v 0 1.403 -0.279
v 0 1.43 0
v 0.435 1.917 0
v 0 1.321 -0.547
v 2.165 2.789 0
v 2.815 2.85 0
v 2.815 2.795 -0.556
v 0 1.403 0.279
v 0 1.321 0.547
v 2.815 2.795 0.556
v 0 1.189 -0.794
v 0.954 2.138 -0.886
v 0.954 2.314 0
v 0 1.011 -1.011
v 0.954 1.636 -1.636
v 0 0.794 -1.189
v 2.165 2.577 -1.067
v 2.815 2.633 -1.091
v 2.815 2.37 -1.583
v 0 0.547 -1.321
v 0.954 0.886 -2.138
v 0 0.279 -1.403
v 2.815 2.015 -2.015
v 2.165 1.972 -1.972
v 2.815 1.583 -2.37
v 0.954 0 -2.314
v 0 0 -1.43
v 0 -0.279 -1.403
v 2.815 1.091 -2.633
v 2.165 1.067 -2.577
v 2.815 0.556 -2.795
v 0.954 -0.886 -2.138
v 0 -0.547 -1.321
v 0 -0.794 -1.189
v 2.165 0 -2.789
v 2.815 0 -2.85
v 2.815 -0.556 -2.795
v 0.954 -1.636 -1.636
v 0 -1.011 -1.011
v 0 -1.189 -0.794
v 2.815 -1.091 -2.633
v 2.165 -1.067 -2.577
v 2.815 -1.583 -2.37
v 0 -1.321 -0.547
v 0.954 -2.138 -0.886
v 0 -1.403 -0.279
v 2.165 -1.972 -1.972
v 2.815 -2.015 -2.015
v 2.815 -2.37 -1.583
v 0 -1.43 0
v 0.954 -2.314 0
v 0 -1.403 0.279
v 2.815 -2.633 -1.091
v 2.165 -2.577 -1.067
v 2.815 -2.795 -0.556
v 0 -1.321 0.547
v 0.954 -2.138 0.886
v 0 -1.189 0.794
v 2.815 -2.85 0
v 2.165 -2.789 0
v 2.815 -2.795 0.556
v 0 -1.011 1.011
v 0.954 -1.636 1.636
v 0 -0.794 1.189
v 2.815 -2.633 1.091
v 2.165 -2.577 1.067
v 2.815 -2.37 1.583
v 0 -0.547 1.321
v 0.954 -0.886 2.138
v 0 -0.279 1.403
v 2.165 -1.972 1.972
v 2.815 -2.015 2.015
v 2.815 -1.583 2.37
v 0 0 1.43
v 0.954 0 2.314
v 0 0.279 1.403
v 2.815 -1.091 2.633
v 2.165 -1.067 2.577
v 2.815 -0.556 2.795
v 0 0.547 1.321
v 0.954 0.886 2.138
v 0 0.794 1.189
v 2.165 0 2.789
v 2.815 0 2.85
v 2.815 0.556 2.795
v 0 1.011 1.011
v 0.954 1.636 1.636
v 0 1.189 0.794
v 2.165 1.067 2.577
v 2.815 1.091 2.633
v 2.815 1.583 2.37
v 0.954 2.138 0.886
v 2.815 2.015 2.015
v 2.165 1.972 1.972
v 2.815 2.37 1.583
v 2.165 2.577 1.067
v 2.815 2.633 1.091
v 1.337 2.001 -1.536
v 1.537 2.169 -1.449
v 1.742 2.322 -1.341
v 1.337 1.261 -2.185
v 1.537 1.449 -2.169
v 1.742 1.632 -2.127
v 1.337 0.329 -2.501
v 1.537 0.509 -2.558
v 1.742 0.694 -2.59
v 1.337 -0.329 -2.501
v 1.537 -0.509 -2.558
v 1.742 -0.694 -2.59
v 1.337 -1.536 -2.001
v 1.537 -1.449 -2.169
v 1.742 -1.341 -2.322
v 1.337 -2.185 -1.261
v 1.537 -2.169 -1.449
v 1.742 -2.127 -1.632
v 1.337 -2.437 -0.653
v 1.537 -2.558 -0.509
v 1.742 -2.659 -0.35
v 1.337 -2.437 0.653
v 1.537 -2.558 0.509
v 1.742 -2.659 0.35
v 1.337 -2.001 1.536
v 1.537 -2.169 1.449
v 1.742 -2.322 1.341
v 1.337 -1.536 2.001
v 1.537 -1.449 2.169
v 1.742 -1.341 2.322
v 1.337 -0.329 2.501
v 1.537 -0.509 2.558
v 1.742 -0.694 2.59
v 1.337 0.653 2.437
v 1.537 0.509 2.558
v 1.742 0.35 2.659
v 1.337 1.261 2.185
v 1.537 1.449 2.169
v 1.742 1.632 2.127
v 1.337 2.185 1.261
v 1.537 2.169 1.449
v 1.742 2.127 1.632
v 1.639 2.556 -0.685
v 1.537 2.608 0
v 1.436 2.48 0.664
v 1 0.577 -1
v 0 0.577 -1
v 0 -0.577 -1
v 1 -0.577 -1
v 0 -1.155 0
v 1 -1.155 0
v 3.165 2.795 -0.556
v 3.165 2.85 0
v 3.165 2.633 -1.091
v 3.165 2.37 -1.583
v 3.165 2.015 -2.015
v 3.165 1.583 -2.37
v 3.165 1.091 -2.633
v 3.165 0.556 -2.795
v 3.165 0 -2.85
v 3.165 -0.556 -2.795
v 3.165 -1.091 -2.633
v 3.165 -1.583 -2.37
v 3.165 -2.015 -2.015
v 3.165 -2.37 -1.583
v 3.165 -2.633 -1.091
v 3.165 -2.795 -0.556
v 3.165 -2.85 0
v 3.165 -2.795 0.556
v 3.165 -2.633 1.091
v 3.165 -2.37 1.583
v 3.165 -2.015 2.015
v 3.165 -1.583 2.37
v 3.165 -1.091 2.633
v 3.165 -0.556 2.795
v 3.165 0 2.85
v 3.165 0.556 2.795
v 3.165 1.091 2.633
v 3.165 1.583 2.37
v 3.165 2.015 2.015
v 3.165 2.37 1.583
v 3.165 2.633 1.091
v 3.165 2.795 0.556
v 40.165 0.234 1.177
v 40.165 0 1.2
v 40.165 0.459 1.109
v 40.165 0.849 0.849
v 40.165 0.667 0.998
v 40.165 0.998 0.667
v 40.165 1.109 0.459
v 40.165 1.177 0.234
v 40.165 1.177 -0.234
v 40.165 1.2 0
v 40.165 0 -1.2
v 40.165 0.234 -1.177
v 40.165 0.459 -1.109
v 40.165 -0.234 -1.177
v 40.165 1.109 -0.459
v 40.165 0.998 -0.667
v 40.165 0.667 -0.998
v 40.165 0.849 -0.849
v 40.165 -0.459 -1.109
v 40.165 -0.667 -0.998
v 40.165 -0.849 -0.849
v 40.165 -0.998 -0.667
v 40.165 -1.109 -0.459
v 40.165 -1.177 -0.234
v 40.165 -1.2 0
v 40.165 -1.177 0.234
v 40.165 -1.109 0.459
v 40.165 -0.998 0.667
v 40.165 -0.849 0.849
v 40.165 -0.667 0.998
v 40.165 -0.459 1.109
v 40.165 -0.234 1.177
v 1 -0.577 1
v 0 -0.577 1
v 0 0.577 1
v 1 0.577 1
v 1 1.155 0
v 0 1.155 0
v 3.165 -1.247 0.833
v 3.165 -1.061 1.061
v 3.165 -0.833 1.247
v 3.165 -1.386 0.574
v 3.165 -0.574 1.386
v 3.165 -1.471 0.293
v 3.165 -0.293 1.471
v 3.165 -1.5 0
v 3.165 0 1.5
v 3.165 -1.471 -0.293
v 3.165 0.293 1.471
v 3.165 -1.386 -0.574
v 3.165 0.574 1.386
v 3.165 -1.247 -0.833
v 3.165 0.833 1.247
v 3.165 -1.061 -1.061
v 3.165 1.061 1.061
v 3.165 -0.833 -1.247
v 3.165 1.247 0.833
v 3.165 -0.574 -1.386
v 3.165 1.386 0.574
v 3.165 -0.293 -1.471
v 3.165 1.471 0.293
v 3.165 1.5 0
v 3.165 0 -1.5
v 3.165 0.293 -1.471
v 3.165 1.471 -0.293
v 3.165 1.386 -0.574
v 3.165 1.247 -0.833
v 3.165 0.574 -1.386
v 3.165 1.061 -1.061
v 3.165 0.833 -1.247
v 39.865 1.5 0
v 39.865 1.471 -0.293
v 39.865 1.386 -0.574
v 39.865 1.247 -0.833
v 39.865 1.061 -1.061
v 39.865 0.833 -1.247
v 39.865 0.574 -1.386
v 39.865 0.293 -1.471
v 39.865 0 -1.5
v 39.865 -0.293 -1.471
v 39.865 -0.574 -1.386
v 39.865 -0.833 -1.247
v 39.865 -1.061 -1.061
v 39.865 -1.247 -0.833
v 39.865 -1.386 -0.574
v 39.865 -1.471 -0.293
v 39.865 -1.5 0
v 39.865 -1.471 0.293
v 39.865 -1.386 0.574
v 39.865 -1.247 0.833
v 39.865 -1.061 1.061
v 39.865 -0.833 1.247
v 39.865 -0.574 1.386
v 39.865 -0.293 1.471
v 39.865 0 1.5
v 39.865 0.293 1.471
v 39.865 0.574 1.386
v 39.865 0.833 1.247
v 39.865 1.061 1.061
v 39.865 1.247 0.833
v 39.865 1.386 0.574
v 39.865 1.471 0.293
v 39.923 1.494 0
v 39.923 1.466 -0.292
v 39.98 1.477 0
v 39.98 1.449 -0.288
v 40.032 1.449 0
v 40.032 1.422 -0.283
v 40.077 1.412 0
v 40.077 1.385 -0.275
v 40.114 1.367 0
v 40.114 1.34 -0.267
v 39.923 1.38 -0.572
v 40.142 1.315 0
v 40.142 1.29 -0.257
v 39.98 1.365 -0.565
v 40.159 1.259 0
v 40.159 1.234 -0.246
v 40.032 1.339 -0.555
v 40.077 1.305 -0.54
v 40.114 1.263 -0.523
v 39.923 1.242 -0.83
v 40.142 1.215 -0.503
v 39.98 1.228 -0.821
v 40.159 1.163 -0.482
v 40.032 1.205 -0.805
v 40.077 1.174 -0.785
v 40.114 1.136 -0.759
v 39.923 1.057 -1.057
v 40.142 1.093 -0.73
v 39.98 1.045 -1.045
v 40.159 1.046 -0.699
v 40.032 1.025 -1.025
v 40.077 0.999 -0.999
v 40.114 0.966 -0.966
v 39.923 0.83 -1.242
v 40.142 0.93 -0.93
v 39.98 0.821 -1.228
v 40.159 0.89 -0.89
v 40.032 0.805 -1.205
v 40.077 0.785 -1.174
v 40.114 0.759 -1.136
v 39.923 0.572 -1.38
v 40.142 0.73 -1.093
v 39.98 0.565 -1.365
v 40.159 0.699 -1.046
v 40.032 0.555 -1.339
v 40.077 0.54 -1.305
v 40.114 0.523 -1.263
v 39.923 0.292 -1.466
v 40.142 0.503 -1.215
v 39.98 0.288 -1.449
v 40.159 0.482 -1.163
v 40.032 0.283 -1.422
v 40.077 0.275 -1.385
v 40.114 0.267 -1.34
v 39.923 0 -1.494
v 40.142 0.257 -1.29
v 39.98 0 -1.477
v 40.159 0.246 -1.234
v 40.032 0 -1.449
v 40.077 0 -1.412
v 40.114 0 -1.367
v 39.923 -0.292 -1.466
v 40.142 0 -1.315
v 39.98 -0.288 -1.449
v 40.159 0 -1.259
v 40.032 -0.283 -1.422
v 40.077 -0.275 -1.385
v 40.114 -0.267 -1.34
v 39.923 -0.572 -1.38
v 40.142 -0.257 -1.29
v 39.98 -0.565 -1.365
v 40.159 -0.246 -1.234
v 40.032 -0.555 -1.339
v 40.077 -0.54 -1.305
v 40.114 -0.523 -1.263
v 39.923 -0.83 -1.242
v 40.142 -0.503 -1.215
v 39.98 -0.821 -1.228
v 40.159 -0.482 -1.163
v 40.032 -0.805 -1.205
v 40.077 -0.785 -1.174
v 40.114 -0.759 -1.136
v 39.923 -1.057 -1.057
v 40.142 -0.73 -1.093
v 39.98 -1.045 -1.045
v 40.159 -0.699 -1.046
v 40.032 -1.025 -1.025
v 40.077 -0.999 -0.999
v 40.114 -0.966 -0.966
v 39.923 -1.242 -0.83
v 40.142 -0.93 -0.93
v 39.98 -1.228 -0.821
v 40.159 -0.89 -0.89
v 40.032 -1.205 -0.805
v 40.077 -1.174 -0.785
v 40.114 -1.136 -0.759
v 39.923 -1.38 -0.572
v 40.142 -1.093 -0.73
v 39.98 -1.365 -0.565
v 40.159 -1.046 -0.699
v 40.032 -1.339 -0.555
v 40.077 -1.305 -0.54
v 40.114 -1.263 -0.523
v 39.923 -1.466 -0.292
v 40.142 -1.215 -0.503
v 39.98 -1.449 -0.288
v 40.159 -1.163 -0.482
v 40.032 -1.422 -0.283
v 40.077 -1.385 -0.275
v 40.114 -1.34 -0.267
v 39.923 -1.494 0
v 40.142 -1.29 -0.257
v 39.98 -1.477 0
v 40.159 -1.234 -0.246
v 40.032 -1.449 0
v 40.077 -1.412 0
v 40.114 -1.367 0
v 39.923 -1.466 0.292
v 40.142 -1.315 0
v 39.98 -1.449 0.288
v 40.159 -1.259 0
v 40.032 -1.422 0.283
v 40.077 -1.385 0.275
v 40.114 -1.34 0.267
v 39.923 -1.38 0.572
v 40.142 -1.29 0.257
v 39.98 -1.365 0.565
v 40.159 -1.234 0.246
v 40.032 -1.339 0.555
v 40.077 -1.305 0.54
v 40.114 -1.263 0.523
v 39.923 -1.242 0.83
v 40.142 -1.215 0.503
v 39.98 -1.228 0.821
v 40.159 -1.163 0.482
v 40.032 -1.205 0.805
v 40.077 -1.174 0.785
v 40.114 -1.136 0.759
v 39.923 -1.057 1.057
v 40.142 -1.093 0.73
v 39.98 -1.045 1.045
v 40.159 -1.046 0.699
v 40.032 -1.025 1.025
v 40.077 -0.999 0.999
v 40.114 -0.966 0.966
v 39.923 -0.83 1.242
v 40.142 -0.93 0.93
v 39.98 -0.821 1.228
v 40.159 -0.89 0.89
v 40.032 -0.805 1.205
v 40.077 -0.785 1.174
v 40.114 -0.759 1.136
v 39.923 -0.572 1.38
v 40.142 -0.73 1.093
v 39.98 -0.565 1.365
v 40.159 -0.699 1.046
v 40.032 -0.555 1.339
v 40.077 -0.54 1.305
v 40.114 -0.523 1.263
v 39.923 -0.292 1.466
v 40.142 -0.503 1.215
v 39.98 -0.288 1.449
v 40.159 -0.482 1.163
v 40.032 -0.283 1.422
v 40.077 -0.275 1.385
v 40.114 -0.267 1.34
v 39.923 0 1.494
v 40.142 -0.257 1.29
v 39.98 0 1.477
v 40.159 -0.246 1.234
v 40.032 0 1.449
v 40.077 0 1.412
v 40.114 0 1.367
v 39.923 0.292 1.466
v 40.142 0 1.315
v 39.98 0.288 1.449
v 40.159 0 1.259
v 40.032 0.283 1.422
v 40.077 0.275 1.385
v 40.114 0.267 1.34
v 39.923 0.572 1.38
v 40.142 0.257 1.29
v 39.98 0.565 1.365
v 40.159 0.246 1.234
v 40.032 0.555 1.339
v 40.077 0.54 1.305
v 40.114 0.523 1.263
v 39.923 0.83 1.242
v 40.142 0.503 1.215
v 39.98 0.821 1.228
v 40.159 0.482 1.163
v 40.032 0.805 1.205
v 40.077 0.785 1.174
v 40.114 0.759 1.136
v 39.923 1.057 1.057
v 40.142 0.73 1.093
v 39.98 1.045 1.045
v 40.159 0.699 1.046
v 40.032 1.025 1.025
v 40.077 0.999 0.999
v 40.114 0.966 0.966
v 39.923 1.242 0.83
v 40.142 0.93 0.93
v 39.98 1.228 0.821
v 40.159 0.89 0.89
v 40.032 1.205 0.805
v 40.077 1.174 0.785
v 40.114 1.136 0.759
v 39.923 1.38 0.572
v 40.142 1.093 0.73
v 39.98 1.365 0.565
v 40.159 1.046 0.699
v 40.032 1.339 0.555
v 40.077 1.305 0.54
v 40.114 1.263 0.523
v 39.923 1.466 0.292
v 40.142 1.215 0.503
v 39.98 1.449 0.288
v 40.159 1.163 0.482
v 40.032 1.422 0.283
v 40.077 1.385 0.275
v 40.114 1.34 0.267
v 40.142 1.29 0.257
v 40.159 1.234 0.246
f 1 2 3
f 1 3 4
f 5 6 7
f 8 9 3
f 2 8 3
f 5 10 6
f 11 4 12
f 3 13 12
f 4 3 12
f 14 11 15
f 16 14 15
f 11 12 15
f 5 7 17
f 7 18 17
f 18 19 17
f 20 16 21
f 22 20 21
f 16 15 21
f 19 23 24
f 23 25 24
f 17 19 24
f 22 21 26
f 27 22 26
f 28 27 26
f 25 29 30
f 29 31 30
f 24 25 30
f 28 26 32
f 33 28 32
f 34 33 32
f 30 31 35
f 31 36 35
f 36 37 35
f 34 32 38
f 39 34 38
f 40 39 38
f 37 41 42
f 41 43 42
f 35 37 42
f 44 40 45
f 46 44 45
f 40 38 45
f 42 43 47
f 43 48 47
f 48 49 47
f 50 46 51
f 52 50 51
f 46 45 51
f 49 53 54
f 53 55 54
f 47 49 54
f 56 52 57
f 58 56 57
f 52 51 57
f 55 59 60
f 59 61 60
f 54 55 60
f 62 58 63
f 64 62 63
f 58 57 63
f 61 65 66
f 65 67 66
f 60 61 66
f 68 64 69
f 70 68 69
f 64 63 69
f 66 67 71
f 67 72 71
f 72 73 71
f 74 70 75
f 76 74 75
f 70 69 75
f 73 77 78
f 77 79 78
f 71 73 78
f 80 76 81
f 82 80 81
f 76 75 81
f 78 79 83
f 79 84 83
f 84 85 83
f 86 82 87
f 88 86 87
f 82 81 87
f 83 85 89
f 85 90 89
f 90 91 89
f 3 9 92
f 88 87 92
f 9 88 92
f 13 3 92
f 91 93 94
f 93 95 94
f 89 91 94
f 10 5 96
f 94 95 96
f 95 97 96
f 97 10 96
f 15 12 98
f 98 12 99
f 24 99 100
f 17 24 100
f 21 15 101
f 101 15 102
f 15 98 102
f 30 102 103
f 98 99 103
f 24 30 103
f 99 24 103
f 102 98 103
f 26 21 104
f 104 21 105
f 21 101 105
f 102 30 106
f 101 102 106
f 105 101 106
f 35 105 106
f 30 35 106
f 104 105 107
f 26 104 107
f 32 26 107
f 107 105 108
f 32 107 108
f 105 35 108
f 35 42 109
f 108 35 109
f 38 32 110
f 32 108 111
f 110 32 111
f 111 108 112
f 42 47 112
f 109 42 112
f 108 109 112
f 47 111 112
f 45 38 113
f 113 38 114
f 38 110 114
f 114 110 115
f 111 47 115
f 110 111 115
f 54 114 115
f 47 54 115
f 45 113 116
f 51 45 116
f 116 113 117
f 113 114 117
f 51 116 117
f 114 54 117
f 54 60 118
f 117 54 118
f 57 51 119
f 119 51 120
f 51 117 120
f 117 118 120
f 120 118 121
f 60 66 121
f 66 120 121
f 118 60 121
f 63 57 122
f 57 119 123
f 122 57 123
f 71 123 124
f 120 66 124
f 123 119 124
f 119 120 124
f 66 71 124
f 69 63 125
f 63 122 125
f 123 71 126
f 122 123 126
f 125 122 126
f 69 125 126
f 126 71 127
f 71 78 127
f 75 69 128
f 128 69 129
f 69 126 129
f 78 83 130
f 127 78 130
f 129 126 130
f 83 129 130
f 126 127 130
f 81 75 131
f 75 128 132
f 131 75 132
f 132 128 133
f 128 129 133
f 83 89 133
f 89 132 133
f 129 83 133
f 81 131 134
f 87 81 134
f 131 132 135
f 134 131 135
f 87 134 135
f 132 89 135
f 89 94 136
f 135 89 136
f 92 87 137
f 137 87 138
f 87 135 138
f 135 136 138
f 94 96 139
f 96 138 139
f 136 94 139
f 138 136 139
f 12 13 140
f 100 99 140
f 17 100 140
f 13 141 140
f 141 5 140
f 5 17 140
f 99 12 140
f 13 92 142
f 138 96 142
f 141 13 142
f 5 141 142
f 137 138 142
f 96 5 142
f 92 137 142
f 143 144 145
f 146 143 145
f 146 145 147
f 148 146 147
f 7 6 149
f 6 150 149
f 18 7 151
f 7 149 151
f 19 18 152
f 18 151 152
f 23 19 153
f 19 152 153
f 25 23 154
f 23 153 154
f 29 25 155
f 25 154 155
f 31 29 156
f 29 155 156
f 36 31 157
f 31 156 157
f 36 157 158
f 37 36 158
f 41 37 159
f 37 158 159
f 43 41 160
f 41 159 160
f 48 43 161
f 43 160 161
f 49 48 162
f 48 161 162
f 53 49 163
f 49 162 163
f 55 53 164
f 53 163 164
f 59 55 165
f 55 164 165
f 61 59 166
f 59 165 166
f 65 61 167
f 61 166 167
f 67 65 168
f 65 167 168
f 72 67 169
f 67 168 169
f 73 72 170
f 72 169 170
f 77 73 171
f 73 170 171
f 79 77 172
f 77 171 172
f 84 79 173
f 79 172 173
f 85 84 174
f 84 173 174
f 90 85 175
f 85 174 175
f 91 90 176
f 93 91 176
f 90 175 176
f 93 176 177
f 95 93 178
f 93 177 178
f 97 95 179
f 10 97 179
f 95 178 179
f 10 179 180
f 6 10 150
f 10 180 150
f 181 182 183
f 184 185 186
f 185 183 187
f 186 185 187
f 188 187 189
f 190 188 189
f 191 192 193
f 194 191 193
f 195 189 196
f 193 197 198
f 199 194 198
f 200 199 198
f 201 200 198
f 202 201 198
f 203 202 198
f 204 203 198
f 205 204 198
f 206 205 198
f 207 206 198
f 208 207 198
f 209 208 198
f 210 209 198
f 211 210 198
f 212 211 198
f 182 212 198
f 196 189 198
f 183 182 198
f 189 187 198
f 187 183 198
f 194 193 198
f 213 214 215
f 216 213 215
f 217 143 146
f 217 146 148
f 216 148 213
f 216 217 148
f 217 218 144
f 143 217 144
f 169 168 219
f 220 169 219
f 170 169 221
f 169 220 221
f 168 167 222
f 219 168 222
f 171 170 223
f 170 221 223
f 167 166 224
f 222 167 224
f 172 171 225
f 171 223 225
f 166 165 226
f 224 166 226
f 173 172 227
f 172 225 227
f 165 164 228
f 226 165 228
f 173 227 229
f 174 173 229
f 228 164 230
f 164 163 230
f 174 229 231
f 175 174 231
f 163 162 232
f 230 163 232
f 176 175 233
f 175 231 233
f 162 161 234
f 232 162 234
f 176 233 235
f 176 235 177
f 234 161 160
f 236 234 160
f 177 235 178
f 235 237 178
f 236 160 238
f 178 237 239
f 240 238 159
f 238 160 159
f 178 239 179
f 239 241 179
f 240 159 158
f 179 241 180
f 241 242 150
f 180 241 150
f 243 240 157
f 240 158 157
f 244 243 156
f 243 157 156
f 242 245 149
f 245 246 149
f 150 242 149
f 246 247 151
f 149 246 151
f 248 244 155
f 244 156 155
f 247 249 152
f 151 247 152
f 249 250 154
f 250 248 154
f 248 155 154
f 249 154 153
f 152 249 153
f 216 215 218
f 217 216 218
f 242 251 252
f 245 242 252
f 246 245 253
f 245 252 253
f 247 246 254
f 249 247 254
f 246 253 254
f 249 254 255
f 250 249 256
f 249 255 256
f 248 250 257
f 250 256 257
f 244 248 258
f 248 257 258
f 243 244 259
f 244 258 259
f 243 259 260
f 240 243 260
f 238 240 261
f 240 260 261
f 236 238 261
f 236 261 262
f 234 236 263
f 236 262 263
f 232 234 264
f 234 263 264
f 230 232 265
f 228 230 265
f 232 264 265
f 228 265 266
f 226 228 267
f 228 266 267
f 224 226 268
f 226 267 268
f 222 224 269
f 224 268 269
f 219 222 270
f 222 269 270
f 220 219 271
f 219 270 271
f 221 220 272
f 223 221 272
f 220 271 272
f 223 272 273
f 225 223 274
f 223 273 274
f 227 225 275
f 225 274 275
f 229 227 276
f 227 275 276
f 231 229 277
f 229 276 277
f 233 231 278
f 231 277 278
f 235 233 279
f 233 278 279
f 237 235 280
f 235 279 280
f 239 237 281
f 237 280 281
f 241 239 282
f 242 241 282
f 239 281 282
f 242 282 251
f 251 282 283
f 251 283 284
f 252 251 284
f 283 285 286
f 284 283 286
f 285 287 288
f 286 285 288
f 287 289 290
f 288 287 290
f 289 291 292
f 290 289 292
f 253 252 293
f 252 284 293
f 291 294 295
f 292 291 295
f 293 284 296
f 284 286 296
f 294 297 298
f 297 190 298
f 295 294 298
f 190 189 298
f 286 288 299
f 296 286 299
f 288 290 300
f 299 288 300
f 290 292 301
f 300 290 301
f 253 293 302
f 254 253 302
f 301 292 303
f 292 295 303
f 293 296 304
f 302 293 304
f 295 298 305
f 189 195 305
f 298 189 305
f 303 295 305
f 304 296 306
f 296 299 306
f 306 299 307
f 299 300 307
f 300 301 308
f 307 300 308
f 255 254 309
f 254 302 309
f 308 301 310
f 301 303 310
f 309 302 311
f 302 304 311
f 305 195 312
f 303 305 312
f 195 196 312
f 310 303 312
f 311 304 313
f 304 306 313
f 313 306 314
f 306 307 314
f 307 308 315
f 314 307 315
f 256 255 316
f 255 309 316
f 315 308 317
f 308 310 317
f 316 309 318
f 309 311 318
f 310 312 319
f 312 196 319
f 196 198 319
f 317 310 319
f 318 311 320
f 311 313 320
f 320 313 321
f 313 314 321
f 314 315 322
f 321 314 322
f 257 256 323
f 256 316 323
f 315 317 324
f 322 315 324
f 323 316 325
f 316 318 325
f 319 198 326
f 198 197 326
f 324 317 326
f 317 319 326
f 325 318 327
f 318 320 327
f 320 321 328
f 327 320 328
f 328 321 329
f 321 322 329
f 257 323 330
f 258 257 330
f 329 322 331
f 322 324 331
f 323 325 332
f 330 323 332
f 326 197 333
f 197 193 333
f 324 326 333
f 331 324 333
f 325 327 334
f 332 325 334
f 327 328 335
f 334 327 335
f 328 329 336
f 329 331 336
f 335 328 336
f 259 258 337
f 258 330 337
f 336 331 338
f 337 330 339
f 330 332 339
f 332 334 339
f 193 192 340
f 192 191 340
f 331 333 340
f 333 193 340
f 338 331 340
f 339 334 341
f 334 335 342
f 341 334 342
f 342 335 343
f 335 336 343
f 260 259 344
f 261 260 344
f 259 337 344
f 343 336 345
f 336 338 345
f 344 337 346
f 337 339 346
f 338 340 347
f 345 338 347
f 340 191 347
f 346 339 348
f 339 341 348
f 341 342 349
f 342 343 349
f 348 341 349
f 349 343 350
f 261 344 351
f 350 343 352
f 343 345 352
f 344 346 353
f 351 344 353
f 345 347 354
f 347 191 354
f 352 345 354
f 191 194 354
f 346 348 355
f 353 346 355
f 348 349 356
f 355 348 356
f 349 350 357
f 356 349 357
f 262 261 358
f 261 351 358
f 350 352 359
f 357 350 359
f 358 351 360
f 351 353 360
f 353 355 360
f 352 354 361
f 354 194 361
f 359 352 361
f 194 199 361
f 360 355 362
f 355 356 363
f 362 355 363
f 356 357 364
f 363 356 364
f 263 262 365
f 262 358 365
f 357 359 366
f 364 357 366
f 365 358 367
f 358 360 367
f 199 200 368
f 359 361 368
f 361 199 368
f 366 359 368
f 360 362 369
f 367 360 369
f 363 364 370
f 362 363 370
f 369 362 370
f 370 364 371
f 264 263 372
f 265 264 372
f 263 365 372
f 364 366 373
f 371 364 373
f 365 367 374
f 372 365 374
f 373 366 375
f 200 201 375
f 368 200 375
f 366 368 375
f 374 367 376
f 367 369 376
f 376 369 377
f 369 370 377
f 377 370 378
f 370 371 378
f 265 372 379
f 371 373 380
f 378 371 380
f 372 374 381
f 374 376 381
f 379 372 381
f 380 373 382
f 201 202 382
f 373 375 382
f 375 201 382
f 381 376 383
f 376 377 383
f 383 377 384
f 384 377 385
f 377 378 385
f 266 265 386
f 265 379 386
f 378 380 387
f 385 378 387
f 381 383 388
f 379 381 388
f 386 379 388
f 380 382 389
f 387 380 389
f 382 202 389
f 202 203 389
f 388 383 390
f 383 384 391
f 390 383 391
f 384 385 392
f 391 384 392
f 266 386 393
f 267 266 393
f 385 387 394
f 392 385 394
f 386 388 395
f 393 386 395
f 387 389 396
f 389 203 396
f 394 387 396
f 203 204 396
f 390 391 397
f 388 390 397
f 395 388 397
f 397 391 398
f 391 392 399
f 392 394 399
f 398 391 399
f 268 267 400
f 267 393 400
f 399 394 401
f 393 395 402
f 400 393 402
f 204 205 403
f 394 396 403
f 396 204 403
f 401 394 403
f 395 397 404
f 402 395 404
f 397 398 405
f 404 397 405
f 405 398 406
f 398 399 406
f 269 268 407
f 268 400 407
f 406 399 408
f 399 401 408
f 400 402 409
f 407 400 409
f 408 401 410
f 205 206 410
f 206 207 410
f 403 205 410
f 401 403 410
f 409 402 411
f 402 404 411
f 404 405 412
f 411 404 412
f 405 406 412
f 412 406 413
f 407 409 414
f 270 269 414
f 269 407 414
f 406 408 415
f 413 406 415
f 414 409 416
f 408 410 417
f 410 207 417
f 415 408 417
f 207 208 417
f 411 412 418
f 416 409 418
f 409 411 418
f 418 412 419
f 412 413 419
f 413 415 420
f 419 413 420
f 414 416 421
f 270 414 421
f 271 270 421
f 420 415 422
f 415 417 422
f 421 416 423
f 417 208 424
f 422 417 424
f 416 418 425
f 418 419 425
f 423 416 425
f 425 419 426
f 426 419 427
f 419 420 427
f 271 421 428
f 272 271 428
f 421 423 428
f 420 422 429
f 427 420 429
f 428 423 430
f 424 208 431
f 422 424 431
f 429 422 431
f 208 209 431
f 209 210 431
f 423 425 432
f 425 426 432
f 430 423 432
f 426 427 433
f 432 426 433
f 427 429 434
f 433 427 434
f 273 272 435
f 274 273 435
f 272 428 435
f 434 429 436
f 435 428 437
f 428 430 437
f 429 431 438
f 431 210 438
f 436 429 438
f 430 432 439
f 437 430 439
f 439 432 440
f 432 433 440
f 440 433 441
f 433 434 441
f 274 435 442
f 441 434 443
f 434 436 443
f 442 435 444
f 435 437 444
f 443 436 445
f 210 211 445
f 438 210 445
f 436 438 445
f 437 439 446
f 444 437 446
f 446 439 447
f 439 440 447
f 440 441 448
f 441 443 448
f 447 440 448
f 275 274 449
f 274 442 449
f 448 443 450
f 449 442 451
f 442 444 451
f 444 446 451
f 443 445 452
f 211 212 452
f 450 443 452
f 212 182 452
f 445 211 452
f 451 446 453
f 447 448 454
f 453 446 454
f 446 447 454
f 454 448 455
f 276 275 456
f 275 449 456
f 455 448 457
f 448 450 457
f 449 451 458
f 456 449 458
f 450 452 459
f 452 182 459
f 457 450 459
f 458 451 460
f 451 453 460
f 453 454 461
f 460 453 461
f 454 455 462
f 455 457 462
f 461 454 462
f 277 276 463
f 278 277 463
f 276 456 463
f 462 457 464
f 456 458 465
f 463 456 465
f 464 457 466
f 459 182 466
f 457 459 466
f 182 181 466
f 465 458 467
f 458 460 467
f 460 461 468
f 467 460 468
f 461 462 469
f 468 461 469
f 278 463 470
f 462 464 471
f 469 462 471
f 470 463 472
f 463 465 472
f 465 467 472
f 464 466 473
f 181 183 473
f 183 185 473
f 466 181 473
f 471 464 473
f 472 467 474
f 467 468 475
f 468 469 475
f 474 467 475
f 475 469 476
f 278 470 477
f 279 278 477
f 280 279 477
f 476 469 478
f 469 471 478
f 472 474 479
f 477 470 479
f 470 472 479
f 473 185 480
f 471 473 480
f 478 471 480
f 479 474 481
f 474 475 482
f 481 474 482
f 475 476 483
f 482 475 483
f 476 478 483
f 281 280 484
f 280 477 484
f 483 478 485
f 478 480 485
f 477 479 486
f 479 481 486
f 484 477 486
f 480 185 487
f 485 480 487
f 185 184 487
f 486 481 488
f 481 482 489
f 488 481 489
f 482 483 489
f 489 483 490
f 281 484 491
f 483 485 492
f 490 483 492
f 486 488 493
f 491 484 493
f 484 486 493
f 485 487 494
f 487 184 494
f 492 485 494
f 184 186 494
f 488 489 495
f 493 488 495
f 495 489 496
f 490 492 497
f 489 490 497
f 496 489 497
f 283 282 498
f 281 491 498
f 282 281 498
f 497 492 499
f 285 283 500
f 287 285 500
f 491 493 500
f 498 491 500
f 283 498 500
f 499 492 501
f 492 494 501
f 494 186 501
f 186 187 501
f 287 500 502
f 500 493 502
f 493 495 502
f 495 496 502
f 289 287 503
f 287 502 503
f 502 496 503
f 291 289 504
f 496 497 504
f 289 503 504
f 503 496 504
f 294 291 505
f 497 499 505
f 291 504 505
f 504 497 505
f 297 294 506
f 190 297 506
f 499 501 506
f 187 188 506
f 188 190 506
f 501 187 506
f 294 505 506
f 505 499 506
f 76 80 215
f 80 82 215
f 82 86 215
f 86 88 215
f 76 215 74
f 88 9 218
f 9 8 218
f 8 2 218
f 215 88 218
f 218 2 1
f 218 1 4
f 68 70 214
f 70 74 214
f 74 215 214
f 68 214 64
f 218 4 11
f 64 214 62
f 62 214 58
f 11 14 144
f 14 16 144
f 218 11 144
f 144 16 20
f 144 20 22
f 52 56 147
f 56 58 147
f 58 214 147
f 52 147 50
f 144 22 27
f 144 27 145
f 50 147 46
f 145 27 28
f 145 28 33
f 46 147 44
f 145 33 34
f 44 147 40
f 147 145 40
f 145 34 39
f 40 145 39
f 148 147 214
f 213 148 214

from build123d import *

# Parameters (mm, degrees)
CONG_1_R                = 0.3
ENL_V_MAT_EXTRU_1_DEPTH = 1


with BuildPart() as part:
    # Esquisse1 → Révolution1 (revolve)
    with BuildSketch(Plane.XY):
        with BuildLine():
            Line((40.164888985, 0), (0, 0))
            Line((0, 0), (0, 1.43))
            ThreePointArc((0, 1.43), (1.238500708, 2.474899998), (2.814888985, 2.85))
            Line((2.814888985, 2.85), (3.164888985, 2.85))
            Line((3.164888985, 2.85), (3.164888985, 1.5))
            Line((3.164888985, 1.5), (40.164888985, 1.5))
            Line((40.164888985, 1.5), (40.164888985, 0))
        make_face()
    revolve(axis=Axis((40.164888985, 0, 0), (-1, 0, 0)))

    # Congé1
    cong_1_edges = [part.edges().sort_by_distance(p)[0] for p in [
        (40.164888985, -1.5, 0),
    ]]
    fillet(cong_1_edges, radius=CONG_1_R)

    # Esquisse2 → Enlèv. mat.-Extru.1 (cut)
    with BuildSketch(Plane.ZY):
        Polygon((0, 1.154700538), (-1, 0.577350269), (-1, -0.577350269), (0, -1.154700538), (1, -0.577350269), (1, 0.577350269), align=None)
    extrude(amount=-ENL_V_MAT_EXTRU_1_DEPTH, mode=Mode.SUBTRACT)


solid = part.part
